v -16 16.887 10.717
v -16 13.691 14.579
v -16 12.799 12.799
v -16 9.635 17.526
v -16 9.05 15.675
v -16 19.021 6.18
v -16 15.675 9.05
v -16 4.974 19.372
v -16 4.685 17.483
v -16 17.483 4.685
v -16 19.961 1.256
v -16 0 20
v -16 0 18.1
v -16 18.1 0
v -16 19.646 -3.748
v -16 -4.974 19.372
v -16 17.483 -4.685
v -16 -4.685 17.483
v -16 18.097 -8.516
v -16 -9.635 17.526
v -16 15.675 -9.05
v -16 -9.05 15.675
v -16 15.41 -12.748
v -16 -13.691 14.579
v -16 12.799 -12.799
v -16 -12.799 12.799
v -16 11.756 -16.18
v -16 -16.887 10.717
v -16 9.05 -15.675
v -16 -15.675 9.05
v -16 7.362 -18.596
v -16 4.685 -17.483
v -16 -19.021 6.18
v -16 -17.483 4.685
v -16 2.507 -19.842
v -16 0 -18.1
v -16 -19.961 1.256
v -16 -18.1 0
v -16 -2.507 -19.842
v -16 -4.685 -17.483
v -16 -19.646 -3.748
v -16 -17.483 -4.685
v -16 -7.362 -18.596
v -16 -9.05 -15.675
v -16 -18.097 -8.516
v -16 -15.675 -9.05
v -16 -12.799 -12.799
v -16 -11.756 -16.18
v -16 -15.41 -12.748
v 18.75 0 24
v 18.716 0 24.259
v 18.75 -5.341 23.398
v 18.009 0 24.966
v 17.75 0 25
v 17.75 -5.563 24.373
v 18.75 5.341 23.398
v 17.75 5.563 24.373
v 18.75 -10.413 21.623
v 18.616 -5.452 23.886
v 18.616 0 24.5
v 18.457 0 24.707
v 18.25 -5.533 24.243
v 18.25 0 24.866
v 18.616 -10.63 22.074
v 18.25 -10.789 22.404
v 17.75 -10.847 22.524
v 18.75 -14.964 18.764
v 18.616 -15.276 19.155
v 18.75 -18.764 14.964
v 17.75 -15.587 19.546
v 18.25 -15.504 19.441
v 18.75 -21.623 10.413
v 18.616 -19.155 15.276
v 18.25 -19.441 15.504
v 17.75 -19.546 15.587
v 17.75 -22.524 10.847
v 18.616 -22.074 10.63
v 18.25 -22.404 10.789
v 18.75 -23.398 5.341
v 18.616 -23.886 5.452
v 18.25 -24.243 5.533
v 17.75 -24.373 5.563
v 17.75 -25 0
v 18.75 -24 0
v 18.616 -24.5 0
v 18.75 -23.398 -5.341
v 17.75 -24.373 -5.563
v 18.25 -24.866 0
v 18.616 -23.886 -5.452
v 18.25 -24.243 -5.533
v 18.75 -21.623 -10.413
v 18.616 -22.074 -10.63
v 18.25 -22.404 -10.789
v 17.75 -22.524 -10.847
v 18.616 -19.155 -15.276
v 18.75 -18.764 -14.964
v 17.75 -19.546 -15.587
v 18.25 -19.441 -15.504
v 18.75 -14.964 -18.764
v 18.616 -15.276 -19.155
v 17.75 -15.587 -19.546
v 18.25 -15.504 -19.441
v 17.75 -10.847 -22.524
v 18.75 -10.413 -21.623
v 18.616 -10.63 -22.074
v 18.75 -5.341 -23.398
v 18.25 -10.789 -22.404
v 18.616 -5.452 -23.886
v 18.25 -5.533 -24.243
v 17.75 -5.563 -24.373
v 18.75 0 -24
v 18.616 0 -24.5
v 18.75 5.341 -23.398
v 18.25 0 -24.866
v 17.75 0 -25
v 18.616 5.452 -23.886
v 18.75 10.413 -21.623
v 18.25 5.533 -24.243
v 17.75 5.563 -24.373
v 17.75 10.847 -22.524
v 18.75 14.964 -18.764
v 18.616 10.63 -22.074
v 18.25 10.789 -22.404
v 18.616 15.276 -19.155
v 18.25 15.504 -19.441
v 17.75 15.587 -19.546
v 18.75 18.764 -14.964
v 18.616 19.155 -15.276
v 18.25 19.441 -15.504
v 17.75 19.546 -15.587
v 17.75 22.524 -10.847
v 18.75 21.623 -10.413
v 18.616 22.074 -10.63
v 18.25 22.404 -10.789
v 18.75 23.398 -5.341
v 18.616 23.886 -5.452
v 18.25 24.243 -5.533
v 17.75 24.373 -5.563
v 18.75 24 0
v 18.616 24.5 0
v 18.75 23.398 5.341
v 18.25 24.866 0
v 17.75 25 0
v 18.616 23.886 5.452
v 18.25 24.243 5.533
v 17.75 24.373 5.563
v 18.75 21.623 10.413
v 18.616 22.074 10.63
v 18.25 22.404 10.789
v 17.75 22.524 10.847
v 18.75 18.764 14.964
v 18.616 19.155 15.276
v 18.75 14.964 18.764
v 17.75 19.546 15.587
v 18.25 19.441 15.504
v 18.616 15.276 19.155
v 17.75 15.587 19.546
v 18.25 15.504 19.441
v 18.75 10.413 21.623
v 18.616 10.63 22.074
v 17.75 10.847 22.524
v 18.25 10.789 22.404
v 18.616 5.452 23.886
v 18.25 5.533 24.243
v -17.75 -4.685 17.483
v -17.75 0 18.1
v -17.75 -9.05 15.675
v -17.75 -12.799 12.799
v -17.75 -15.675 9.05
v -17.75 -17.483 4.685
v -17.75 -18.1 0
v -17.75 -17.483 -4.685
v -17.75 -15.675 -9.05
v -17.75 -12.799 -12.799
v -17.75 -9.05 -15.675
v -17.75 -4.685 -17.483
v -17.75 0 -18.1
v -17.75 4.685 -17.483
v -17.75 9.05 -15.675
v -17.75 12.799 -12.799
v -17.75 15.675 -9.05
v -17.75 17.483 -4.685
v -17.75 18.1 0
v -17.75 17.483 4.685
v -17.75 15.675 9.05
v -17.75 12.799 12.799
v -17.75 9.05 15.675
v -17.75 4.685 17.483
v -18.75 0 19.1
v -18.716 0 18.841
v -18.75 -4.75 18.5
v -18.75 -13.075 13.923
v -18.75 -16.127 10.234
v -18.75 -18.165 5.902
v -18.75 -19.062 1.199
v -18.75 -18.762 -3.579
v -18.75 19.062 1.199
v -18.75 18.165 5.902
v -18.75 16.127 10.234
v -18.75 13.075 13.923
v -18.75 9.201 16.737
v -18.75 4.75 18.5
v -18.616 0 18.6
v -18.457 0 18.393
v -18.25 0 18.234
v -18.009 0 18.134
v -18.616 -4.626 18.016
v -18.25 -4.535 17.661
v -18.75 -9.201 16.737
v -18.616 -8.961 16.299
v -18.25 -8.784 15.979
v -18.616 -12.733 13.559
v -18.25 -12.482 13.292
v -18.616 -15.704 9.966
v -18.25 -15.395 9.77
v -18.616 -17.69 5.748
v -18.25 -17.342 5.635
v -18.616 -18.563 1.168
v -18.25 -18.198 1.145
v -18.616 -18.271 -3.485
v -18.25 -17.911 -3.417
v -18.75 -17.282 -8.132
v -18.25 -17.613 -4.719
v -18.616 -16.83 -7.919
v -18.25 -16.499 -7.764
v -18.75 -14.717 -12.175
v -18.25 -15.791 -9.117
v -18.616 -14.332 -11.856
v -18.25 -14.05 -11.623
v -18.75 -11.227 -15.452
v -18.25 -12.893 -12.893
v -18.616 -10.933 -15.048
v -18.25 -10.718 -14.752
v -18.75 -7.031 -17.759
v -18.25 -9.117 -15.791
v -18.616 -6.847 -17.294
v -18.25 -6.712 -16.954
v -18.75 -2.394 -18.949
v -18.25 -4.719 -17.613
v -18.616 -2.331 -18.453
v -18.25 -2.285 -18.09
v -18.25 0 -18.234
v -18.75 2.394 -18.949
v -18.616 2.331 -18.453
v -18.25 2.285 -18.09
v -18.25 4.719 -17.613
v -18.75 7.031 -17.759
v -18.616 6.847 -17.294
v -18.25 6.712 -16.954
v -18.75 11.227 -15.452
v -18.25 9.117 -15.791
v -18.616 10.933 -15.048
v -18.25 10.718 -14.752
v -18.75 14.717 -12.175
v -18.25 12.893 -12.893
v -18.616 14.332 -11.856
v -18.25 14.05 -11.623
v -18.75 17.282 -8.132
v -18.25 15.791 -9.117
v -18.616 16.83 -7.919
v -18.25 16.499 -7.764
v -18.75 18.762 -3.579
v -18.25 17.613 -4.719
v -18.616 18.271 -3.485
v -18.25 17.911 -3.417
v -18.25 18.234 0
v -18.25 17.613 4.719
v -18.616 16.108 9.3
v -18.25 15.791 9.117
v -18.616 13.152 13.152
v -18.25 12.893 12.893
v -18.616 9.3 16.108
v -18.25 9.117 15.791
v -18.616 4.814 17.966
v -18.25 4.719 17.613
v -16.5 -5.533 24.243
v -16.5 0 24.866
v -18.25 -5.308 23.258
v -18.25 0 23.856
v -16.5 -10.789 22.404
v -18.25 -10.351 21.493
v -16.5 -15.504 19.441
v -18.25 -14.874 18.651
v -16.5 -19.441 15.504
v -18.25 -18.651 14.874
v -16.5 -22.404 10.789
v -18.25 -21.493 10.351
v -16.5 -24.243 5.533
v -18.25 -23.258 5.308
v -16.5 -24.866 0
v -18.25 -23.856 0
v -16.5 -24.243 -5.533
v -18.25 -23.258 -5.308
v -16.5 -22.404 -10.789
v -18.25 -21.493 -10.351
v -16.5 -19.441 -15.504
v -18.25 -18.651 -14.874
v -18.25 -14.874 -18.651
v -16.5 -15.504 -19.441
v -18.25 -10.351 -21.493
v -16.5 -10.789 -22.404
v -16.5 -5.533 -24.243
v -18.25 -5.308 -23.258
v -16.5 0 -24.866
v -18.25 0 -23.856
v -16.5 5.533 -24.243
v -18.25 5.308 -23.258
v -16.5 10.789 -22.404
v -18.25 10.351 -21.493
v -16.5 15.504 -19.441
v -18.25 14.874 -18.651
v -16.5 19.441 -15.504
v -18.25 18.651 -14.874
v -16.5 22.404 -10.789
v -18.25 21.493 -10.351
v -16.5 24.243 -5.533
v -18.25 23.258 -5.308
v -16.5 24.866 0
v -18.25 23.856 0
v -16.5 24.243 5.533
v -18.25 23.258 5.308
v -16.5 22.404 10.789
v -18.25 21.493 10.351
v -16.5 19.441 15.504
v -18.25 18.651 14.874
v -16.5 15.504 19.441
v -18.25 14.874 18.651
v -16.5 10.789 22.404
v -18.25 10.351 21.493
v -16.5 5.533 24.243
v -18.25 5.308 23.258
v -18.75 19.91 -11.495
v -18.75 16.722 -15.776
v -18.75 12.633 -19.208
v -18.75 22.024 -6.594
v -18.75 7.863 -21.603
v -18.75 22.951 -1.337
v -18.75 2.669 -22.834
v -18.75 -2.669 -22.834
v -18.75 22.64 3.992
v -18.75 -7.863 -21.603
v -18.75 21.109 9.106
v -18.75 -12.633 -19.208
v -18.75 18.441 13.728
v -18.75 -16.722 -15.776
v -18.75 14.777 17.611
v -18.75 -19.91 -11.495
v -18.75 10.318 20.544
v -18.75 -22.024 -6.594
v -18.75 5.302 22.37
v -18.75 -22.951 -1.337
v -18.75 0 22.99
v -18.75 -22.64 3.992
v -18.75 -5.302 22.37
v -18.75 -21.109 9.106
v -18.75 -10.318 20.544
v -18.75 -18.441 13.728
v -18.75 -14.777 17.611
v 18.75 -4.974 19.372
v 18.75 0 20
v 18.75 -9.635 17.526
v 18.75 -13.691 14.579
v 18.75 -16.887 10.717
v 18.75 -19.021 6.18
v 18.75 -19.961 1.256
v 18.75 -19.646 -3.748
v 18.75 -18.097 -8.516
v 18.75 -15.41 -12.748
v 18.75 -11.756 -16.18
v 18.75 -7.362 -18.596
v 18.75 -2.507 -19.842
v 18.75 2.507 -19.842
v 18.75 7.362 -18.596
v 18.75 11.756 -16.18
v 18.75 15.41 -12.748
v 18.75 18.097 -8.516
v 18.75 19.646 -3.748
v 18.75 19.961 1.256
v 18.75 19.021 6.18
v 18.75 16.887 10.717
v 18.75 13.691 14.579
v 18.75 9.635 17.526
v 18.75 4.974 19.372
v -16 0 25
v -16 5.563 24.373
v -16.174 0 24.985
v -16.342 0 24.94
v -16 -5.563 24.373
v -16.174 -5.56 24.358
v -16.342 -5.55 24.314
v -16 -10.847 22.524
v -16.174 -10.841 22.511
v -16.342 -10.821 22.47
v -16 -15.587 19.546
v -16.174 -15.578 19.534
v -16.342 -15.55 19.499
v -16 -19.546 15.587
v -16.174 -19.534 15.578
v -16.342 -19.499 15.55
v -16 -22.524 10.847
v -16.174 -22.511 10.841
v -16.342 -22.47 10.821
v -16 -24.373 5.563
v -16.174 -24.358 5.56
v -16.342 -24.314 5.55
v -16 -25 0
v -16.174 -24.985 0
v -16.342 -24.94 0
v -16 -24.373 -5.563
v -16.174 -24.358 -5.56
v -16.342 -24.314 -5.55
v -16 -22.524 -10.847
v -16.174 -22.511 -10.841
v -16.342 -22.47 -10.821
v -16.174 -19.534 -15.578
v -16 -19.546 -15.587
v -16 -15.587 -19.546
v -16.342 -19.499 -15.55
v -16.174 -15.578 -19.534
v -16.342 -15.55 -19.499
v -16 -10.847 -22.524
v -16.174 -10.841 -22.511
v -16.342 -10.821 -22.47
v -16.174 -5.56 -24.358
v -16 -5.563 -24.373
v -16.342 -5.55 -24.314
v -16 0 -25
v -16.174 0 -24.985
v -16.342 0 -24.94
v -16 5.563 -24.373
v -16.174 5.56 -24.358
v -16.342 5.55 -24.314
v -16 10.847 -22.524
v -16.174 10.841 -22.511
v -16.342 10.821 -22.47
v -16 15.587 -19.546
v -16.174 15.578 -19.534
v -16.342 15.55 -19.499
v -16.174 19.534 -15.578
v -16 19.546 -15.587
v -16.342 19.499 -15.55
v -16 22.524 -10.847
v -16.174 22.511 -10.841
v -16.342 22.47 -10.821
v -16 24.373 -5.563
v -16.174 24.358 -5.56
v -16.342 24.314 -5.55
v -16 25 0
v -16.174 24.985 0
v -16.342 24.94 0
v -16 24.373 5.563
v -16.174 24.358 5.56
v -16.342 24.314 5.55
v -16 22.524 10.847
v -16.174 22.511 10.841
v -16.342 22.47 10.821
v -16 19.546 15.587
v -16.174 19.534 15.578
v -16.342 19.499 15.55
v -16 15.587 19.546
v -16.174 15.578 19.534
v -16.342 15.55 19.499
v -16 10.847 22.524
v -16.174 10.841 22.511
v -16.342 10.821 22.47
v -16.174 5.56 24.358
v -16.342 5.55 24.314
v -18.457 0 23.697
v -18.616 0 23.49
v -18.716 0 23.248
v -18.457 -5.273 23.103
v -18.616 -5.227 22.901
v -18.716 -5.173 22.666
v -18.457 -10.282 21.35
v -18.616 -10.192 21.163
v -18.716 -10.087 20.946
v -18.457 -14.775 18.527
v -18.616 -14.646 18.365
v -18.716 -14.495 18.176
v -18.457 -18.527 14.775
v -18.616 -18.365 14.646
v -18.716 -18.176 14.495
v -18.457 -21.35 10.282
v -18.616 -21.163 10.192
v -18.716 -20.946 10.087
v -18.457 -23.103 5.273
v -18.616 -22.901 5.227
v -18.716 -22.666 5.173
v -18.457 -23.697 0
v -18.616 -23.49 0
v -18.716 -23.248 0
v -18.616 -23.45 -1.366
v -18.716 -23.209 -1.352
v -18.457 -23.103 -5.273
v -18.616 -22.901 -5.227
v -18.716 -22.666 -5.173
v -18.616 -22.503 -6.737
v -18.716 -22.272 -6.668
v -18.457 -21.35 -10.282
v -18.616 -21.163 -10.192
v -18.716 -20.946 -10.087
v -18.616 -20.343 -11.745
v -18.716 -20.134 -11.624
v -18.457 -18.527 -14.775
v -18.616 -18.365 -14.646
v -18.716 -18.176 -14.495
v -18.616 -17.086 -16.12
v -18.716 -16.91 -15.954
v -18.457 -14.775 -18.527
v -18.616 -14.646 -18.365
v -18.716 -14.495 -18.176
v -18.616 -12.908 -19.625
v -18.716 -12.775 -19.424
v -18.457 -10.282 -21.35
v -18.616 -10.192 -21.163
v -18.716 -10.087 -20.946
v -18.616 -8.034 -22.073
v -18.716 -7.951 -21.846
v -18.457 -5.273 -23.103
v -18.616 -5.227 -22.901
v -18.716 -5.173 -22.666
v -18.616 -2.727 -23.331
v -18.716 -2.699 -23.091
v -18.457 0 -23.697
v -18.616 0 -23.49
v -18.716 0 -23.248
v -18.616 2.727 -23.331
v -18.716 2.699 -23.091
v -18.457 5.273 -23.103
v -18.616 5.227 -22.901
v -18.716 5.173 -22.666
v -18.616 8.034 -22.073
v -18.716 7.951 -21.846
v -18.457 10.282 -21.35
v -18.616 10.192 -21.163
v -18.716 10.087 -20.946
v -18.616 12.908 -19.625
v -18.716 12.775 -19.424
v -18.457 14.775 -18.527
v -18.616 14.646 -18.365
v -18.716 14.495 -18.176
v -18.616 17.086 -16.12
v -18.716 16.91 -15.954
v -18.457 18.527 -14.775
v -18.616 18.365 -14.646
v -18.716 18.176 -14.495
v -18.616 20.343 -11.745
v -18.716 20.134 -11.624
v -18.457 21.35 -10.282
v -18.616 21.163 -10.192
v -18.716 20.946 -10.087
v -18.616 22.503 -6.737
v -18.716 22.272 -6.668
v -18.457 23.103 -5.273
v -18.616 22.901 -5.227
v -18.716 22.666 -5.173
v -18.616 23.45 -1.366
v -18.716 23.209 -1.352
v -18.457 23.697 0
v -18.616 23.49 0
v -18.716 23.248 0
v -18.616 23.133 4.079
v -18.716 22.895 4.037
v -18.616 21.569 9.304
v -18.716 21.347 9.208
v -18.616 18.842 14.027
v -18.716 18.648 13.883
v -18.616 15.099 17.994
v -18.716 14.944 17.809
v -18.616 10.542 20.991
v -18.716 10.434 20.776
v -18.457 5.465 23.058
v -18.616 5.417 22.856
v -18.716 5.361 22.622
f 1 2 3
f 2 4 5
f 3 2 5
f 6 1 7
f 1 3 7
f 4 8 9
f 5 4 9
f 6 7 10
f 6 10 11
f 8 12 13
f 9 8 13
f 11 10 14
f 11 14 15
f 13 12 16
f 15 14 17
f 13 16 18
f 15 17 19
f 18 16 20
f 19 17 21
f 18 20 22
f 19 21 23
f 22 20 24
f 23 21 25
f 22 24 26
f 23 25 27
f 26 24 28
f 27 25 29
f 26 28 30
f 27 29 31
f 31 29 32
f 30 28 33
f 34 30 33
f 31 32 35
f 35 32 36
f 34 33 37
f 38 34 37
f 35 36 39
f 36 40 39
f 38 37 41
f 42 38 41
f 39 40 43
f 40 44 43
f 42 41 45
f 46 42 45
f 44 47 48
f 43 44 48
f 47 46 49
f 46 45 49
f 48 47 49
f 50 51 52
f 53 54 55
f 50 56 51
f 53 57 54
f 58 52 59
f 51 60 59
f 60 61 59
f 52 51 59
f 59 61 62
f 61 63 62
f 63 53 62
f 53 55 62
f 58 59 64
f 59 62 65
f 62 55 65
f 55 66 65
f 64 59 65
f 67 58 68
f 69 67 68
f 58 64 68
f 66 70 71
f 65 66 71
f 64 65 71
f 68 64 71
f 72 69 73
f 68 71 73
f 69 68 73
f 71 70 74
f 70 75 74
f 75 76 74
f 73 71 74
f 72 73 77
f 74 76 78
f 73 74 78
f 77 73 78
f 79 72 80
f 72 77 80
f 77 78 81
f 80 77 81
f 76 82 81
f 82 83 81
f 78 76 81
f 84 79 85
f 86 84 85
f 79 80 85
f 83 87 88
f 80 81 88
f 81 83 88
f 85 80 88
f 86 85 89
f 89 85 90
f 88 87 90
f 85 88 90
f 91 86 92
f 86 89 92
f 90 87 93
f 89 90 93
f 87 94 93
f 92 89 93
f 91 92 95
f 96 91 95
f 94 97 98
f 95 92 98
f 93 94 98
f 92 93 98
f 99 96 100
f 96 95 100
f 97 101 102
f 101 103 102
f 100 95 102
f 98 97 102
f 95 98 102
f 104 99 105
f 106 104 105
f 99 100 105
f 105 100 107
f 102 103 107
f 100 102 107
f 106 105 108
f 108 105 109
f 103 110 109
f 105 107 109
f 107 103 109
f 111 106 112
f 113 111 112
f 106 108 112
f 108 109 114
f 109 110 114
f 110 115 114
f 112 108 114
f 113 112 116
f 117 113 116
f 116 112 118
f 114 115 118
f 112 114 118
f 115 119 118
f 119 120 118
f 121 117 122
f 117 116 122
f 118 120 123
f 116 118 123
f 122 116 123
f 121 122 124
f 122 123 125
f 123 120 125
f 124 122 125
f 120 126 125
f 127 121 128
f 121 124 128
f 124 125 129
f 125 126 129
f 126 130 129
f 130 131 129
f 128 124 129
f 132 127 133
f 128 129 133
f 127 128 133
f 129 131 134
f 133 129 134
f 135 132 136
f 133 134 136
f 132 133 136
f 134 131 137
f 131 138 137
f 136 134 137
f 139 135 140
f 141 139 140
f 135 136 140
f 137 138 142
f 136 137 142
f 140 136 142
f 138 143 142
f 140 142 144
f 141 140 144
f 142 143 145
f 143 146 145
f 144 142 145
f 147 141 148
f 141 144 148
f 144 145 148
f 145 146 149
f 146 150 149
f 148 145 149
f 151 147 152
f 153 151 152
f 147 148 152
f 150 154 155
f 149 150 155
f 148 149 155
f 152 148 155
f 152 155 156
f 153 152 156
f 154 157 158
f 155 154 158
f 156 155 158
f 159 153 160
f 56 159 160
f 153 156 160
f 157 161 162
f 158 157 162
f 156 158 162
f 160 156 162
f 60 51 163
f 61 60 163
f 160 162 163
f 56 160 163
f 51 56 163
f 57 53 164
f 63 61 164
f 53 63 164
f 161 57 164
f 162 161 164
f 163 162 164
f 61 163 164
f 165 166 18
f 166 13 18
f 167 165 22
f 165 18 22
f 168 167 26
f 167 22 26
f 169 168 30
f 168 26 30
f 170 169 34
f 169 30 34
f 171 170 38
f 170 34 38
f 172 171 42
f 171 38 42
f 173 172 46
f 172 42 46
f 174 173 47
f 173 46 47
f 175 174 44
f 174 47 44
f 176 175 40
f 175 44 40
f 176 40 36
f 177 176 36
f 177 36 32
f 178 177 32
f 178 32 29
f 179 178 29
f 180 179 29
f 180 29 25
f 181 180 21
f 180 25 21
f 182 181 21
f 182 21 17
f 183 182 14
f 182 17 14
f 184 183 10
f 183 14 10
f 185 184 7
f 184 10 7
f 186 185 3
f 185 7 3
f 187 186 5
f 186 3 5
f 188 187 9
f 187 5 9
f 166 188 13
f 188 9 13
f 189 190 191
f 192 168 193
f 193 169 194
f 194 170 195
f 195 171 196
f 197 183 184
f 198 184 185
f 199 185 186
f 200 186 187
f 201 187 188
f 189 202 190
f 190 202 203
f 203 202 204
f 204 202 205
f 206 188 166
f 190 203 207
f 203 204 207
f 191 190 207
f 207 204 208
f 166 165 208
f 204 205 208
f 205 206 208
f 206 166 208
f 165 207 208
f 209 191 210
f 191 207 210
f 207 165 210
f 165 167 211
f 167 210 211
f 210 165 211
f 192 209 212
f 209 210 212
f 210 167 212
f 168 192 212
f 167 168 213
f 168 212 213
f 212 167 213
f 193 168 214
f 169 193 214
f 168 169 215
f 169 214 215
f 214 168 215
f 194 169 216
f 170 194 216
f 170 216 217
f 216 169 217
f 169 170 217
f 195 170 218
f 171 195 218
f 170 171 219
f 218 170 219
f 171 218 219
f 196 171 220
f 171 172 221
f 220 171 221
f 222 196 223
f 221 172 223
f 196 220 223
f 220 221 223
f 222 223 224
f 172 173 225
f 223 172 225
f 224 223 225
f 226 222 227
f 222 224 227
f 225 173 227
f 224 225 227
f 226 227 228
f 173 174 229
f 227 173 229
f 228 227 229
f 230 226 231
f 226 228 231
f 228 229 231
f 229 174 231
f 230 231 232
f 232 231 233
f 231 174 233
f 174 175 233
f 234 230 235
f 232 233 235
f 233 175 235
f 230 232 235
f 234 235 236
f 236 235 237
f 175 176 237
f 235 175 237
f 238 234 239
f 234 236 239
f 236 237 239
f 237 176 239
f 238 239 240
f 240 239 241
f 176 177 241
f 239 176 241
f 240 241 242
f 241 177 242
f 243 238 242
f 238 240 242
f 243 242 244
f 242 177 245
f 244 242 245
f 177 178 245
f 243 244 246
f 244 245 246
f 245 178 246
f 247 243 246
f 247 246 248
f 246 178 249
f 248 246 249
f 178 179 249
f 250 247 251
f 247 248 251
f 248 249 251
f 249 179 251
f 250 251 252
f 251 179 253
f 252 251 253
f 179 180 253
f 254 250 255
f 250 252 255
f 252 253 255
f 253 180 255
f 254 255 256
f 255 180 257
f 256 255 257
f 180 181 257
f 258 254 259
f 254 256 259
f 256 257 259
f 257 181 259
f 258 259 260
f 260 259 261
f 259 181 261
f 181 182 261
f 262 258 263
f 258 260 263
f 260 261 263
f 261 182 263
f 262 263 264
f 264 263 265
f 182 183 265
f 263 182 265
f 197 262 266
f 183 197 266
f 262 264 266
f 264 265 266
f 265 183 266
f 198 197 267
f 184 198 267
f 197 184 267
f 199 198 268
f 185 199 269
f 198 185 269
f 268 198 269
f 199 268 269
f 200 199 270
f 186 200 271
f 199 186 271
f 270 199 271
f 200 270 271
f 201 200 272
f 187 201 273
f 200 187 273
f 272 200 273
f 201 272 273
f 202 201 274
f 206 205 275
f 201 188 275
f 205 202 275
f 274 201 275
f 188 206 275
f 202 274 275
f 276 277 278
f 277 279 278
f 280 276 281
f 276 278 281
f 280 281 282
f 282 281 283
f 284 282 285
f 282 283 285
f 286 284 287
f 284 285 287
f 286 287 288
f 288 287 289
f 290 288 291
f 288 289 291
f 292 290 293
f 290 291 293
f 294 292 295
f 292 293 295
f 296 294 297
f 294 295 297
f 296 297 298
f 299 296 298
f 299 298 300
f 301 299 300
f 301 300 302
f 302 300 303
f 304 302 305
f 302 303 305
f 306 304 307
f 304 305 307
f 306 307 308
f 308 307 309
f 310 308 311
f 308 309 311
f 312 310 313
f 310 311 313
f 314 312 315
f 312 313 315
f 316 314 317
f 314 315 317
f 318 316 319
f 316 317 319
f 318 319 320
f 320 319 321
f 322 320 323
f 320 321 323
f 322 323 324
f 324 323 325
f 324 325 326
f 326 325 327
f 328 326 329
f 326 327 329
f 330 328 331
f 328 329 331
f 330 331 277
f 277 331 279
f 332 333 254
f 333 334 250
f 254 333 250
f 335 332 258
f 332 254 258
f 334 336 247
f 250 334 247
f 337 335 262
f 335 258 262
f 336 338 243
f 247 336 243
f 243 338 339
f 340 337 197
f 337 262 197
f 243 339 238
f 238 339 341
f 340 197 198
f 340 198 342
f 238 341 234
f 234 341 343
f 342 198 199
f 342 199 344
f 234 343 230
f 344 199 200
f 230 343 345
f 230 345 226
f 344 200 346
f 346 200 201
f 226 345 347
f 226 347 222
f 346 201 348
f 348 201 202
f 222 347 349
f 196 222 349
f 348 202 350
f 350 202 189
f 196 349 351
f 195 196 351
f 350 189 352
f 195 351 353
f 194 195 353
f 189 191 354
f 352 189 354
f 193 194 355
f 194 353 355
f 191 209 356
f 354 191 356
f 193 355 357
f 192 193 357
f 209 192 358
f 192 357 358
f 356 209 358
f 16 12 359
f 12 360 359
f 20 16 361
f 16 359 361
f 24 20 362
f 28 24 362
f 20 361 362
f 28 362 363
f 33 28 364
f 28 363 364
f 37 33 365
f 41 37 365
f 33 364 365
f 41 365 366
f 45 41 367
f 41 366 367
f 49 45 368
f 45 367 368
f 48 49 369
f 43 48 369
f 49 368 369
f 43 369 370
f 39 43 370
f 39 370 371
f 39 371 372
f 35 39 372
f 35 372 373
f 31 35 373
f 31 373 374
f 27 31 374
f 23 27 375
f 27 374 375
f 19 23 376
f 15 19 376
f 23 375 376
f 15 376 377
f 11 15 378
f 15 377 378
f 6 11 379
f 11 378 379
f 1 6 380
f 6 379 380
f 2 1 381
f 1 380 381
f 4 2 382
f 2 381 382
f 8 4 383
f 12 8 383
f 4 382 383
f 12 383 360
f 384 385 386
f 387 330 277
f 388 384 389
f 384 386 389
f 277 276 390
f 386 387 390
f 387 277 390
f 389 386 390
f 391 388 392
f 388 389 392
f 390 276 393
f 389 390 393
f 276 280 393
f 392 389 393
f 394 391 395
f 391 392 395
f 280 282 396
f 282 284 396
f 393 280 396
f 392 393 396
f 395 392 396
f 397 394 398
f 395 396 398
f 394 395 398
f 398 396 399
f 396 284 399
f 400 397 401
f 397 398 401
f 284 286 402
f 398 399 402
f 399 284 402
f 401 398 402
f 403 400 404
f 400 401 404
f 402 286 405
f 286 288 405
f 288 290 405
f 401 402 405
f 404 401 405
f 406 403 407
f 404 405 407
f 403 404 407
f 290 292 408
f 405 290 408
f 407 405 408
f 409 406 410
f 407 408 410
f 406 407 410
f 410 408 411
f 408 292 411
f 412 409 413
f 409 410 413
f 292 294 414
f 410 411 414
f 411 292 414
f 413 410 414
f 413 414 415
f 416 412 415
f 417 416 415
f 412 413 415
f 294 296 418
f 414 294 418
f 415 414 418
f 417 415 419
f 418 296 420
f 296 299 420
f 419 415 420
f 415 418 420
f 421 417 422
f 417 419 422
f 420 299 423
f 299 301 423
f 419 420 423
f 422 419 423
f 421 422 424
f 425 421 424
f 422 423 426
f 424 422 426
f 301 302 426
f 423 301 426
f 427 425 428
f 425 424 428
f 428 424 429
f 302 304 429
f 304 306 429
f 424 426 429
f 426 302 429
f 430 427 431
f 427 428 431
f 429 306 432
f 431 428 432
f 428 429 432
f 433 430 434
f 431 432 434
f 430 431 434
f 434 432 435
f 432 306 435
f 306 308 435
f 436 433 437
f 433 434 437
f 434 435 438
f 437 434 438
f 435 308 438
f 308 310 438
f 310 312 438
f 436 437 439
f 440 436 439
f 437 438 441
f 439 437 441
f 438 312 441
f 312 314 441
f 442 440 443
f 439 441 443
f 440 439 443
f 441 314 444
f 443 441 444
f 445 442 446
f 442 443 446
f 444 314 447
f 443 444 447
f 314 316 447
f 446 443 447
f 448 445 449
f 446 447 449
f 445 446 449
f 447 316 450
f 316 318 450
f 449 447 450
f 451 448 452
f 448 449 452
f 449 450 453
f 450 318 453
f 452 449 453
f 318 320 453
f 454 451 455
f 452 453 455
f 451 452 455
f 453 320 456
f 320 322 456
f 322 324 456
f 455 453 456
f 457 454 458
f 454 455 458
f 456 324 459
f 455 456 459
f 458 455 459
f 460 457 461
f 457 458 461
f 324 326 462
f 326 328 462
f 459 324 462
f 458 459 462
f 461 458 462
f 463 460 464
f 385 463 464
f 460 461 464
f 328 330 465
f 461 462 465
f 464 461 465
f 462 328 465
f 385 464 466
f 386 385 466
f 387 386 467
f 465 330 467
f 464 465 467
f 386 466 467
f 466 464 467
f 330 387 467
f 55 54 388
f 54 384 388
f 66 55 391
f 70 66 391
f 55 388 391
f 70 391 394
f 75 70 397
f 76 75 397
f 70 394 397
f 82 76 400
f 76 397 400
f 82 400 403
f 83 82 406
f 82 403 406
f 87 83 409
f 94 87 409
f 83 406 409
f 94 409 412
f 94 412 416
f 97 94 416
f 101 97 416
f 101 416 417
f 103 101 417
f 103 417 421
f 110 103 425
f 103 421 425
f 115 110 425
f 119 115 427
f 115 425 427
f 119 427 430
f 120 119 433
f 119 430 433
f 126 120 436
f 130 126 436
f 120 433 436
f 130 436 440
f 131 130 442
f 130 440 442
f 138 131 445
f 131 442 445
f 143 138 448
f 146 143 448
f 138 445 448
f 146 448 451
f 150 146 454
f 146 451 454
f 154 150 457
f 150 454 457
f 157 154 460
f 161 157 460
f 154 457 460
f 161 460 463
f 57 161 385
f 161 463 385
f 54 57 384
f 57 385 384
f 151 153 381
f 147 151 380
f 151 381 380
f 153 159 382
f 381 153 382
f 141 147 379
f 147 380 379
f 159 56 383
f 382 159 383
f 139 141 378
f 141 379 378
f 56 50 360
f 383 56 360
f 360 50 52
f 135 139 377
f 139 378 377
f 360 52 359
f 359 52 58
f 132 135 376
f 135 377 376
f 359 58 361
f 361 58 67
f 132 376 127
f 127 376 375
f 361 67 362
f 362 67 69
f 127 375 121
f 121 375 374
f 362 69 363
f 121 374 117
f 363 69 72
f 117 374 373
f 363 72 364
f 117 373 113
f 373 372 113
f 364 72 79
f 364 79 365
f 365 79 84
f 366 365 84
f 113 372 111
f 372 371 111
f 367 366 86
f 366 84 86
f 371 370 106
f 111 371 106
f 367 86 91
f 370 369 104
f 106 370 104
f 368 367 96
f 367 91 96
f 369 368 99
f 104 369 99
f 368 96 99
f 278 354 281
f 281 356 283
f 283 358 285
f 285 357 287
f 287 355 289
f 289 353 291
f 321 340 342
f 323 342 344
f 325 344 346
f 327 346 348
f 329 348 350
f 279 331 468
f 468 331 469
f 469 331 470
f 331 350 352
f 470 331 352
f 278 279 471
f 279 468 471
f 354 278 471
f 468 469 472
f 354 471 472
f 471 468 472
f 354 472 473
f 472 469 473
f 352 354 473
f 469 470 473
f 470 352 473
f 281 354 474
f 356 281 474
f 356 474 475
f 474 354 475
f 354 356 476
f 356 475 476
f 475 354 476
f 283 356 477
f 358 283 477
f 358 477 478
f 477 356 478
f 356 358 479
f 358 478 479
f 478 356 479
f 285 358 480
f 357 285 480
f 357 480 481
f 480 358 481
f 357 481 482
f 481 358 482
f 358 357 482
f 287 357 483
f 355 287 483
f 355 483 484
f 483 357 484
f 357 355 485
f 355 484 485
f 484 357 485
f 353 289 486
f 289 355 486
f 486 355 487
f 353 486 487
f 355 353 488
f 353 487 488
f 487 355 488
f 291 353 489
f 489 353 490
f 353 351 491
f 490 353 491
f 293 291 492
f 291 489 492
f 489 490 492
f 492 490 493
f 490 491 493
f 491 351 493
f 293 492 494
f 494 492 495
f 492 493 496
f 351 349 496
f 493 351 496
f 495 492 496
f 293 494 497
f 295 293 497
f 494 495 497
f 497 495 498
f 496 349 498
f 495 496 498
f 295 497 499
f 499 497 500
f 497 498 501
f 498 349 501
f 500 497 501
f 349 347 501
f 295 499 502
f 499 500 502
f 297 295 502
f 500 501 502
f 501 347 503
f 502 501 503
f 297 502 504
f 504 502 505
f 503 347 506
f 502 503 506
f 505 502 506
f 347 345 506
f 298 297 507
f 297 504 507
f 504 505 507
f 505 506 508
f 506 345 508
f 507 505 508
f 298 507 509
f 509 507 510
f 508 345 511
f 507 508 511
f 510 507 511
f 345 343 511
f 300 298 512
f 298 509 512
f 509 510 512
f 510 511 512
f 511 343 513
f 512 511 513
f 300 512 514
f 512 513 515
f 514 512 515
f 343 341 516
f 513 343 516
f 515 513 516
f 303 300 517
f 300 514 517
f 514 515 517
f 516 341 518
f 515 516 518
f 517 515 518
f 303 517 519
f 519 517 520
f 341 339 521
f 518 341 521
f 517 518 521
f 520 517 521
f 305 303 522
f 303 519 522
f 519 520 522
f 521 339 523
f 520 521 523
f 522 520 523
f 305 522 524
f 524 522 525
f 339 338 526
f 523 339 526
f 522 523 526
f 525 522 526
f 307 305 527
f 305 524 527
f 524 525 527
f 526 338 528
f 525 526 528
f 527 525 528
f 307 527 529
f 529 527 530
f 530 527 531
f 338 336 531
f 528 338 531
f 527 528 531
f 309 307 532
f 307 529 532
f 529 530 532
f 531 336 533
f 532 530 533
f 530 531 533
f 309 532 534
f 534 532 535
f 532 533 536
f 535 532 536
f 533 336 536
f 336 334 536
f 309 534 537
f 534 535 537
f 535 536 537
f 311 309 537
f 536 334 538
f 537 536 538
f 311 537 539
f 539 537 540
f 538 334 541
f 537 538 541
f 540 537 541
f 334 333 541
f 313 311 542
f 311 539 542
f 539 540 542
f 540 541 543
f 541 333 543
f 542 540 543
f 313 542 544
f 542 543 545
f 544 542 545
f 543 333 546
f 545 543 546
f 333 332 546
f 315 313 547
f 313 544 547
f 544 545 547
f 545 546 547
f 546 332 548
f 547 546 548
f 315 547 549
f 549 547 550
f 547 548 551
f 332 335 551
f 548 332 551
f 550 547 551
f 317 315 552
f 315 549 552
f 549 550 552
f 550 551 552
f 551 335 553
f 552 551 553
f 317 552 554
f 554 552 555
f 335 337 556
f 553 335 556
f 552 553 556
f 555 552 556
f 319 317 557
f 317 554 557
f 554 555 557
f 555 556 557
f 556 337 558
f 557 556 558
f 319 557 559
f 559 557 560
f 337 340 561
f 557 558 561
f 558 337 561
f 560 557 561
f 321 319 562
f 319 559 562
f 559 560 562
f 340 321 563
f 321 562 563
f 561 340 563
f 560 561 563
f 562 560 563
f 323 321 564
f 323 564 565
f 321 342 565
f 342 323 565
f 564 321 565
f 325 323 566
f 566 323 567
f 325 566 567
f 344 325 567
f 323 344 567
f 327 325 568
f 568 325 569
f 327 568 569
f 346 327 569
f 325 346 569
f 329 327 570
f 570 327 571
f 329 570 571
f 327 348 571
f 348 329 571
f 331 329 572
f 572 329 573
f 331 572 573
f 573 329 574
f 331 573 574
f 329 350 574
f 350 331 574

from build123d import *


with BuildPart() as part:
    # Эскиз1 → Повернуть1 (revolve)
    with BuildSketch(Plane.XY):
        with BuildLine():
            Line((18.75, 20), (18.75, 24))
            ThreePointArc((18.75, 24), (18.457106781, 24.707106781), (17.75, 25))
            Line((17.75, 25), (-16, 25))
            ThreePointArc((-16, 25), (-16.258819045, 24.965925826), (-16.5, 24.866025404))
            Line((-16.5, 24.866025404), (-18.25, 23.855662433))
            ThreePointArc((-18.25, 23.855662433), (-18.616025404, 23.489637029), (-18.75, 22.989637029))
            Line((-18.75, 22.989637029), (-18.75, 19.1))
            ThreePointArc((-18.75, 19.1), (-18.457106781, 18.392893219), (-17.75, 18.1))
            Line((-17.75, 18.1), (-16, 18.1))
            Line((-16, 18.1), (-16, 20))
            Line((-16, 20), (18.75, 20))
        make_face()
    revolve(axis=Axis((-18.75, 0, 0), (1, 0, 0)))


solid = part.part
